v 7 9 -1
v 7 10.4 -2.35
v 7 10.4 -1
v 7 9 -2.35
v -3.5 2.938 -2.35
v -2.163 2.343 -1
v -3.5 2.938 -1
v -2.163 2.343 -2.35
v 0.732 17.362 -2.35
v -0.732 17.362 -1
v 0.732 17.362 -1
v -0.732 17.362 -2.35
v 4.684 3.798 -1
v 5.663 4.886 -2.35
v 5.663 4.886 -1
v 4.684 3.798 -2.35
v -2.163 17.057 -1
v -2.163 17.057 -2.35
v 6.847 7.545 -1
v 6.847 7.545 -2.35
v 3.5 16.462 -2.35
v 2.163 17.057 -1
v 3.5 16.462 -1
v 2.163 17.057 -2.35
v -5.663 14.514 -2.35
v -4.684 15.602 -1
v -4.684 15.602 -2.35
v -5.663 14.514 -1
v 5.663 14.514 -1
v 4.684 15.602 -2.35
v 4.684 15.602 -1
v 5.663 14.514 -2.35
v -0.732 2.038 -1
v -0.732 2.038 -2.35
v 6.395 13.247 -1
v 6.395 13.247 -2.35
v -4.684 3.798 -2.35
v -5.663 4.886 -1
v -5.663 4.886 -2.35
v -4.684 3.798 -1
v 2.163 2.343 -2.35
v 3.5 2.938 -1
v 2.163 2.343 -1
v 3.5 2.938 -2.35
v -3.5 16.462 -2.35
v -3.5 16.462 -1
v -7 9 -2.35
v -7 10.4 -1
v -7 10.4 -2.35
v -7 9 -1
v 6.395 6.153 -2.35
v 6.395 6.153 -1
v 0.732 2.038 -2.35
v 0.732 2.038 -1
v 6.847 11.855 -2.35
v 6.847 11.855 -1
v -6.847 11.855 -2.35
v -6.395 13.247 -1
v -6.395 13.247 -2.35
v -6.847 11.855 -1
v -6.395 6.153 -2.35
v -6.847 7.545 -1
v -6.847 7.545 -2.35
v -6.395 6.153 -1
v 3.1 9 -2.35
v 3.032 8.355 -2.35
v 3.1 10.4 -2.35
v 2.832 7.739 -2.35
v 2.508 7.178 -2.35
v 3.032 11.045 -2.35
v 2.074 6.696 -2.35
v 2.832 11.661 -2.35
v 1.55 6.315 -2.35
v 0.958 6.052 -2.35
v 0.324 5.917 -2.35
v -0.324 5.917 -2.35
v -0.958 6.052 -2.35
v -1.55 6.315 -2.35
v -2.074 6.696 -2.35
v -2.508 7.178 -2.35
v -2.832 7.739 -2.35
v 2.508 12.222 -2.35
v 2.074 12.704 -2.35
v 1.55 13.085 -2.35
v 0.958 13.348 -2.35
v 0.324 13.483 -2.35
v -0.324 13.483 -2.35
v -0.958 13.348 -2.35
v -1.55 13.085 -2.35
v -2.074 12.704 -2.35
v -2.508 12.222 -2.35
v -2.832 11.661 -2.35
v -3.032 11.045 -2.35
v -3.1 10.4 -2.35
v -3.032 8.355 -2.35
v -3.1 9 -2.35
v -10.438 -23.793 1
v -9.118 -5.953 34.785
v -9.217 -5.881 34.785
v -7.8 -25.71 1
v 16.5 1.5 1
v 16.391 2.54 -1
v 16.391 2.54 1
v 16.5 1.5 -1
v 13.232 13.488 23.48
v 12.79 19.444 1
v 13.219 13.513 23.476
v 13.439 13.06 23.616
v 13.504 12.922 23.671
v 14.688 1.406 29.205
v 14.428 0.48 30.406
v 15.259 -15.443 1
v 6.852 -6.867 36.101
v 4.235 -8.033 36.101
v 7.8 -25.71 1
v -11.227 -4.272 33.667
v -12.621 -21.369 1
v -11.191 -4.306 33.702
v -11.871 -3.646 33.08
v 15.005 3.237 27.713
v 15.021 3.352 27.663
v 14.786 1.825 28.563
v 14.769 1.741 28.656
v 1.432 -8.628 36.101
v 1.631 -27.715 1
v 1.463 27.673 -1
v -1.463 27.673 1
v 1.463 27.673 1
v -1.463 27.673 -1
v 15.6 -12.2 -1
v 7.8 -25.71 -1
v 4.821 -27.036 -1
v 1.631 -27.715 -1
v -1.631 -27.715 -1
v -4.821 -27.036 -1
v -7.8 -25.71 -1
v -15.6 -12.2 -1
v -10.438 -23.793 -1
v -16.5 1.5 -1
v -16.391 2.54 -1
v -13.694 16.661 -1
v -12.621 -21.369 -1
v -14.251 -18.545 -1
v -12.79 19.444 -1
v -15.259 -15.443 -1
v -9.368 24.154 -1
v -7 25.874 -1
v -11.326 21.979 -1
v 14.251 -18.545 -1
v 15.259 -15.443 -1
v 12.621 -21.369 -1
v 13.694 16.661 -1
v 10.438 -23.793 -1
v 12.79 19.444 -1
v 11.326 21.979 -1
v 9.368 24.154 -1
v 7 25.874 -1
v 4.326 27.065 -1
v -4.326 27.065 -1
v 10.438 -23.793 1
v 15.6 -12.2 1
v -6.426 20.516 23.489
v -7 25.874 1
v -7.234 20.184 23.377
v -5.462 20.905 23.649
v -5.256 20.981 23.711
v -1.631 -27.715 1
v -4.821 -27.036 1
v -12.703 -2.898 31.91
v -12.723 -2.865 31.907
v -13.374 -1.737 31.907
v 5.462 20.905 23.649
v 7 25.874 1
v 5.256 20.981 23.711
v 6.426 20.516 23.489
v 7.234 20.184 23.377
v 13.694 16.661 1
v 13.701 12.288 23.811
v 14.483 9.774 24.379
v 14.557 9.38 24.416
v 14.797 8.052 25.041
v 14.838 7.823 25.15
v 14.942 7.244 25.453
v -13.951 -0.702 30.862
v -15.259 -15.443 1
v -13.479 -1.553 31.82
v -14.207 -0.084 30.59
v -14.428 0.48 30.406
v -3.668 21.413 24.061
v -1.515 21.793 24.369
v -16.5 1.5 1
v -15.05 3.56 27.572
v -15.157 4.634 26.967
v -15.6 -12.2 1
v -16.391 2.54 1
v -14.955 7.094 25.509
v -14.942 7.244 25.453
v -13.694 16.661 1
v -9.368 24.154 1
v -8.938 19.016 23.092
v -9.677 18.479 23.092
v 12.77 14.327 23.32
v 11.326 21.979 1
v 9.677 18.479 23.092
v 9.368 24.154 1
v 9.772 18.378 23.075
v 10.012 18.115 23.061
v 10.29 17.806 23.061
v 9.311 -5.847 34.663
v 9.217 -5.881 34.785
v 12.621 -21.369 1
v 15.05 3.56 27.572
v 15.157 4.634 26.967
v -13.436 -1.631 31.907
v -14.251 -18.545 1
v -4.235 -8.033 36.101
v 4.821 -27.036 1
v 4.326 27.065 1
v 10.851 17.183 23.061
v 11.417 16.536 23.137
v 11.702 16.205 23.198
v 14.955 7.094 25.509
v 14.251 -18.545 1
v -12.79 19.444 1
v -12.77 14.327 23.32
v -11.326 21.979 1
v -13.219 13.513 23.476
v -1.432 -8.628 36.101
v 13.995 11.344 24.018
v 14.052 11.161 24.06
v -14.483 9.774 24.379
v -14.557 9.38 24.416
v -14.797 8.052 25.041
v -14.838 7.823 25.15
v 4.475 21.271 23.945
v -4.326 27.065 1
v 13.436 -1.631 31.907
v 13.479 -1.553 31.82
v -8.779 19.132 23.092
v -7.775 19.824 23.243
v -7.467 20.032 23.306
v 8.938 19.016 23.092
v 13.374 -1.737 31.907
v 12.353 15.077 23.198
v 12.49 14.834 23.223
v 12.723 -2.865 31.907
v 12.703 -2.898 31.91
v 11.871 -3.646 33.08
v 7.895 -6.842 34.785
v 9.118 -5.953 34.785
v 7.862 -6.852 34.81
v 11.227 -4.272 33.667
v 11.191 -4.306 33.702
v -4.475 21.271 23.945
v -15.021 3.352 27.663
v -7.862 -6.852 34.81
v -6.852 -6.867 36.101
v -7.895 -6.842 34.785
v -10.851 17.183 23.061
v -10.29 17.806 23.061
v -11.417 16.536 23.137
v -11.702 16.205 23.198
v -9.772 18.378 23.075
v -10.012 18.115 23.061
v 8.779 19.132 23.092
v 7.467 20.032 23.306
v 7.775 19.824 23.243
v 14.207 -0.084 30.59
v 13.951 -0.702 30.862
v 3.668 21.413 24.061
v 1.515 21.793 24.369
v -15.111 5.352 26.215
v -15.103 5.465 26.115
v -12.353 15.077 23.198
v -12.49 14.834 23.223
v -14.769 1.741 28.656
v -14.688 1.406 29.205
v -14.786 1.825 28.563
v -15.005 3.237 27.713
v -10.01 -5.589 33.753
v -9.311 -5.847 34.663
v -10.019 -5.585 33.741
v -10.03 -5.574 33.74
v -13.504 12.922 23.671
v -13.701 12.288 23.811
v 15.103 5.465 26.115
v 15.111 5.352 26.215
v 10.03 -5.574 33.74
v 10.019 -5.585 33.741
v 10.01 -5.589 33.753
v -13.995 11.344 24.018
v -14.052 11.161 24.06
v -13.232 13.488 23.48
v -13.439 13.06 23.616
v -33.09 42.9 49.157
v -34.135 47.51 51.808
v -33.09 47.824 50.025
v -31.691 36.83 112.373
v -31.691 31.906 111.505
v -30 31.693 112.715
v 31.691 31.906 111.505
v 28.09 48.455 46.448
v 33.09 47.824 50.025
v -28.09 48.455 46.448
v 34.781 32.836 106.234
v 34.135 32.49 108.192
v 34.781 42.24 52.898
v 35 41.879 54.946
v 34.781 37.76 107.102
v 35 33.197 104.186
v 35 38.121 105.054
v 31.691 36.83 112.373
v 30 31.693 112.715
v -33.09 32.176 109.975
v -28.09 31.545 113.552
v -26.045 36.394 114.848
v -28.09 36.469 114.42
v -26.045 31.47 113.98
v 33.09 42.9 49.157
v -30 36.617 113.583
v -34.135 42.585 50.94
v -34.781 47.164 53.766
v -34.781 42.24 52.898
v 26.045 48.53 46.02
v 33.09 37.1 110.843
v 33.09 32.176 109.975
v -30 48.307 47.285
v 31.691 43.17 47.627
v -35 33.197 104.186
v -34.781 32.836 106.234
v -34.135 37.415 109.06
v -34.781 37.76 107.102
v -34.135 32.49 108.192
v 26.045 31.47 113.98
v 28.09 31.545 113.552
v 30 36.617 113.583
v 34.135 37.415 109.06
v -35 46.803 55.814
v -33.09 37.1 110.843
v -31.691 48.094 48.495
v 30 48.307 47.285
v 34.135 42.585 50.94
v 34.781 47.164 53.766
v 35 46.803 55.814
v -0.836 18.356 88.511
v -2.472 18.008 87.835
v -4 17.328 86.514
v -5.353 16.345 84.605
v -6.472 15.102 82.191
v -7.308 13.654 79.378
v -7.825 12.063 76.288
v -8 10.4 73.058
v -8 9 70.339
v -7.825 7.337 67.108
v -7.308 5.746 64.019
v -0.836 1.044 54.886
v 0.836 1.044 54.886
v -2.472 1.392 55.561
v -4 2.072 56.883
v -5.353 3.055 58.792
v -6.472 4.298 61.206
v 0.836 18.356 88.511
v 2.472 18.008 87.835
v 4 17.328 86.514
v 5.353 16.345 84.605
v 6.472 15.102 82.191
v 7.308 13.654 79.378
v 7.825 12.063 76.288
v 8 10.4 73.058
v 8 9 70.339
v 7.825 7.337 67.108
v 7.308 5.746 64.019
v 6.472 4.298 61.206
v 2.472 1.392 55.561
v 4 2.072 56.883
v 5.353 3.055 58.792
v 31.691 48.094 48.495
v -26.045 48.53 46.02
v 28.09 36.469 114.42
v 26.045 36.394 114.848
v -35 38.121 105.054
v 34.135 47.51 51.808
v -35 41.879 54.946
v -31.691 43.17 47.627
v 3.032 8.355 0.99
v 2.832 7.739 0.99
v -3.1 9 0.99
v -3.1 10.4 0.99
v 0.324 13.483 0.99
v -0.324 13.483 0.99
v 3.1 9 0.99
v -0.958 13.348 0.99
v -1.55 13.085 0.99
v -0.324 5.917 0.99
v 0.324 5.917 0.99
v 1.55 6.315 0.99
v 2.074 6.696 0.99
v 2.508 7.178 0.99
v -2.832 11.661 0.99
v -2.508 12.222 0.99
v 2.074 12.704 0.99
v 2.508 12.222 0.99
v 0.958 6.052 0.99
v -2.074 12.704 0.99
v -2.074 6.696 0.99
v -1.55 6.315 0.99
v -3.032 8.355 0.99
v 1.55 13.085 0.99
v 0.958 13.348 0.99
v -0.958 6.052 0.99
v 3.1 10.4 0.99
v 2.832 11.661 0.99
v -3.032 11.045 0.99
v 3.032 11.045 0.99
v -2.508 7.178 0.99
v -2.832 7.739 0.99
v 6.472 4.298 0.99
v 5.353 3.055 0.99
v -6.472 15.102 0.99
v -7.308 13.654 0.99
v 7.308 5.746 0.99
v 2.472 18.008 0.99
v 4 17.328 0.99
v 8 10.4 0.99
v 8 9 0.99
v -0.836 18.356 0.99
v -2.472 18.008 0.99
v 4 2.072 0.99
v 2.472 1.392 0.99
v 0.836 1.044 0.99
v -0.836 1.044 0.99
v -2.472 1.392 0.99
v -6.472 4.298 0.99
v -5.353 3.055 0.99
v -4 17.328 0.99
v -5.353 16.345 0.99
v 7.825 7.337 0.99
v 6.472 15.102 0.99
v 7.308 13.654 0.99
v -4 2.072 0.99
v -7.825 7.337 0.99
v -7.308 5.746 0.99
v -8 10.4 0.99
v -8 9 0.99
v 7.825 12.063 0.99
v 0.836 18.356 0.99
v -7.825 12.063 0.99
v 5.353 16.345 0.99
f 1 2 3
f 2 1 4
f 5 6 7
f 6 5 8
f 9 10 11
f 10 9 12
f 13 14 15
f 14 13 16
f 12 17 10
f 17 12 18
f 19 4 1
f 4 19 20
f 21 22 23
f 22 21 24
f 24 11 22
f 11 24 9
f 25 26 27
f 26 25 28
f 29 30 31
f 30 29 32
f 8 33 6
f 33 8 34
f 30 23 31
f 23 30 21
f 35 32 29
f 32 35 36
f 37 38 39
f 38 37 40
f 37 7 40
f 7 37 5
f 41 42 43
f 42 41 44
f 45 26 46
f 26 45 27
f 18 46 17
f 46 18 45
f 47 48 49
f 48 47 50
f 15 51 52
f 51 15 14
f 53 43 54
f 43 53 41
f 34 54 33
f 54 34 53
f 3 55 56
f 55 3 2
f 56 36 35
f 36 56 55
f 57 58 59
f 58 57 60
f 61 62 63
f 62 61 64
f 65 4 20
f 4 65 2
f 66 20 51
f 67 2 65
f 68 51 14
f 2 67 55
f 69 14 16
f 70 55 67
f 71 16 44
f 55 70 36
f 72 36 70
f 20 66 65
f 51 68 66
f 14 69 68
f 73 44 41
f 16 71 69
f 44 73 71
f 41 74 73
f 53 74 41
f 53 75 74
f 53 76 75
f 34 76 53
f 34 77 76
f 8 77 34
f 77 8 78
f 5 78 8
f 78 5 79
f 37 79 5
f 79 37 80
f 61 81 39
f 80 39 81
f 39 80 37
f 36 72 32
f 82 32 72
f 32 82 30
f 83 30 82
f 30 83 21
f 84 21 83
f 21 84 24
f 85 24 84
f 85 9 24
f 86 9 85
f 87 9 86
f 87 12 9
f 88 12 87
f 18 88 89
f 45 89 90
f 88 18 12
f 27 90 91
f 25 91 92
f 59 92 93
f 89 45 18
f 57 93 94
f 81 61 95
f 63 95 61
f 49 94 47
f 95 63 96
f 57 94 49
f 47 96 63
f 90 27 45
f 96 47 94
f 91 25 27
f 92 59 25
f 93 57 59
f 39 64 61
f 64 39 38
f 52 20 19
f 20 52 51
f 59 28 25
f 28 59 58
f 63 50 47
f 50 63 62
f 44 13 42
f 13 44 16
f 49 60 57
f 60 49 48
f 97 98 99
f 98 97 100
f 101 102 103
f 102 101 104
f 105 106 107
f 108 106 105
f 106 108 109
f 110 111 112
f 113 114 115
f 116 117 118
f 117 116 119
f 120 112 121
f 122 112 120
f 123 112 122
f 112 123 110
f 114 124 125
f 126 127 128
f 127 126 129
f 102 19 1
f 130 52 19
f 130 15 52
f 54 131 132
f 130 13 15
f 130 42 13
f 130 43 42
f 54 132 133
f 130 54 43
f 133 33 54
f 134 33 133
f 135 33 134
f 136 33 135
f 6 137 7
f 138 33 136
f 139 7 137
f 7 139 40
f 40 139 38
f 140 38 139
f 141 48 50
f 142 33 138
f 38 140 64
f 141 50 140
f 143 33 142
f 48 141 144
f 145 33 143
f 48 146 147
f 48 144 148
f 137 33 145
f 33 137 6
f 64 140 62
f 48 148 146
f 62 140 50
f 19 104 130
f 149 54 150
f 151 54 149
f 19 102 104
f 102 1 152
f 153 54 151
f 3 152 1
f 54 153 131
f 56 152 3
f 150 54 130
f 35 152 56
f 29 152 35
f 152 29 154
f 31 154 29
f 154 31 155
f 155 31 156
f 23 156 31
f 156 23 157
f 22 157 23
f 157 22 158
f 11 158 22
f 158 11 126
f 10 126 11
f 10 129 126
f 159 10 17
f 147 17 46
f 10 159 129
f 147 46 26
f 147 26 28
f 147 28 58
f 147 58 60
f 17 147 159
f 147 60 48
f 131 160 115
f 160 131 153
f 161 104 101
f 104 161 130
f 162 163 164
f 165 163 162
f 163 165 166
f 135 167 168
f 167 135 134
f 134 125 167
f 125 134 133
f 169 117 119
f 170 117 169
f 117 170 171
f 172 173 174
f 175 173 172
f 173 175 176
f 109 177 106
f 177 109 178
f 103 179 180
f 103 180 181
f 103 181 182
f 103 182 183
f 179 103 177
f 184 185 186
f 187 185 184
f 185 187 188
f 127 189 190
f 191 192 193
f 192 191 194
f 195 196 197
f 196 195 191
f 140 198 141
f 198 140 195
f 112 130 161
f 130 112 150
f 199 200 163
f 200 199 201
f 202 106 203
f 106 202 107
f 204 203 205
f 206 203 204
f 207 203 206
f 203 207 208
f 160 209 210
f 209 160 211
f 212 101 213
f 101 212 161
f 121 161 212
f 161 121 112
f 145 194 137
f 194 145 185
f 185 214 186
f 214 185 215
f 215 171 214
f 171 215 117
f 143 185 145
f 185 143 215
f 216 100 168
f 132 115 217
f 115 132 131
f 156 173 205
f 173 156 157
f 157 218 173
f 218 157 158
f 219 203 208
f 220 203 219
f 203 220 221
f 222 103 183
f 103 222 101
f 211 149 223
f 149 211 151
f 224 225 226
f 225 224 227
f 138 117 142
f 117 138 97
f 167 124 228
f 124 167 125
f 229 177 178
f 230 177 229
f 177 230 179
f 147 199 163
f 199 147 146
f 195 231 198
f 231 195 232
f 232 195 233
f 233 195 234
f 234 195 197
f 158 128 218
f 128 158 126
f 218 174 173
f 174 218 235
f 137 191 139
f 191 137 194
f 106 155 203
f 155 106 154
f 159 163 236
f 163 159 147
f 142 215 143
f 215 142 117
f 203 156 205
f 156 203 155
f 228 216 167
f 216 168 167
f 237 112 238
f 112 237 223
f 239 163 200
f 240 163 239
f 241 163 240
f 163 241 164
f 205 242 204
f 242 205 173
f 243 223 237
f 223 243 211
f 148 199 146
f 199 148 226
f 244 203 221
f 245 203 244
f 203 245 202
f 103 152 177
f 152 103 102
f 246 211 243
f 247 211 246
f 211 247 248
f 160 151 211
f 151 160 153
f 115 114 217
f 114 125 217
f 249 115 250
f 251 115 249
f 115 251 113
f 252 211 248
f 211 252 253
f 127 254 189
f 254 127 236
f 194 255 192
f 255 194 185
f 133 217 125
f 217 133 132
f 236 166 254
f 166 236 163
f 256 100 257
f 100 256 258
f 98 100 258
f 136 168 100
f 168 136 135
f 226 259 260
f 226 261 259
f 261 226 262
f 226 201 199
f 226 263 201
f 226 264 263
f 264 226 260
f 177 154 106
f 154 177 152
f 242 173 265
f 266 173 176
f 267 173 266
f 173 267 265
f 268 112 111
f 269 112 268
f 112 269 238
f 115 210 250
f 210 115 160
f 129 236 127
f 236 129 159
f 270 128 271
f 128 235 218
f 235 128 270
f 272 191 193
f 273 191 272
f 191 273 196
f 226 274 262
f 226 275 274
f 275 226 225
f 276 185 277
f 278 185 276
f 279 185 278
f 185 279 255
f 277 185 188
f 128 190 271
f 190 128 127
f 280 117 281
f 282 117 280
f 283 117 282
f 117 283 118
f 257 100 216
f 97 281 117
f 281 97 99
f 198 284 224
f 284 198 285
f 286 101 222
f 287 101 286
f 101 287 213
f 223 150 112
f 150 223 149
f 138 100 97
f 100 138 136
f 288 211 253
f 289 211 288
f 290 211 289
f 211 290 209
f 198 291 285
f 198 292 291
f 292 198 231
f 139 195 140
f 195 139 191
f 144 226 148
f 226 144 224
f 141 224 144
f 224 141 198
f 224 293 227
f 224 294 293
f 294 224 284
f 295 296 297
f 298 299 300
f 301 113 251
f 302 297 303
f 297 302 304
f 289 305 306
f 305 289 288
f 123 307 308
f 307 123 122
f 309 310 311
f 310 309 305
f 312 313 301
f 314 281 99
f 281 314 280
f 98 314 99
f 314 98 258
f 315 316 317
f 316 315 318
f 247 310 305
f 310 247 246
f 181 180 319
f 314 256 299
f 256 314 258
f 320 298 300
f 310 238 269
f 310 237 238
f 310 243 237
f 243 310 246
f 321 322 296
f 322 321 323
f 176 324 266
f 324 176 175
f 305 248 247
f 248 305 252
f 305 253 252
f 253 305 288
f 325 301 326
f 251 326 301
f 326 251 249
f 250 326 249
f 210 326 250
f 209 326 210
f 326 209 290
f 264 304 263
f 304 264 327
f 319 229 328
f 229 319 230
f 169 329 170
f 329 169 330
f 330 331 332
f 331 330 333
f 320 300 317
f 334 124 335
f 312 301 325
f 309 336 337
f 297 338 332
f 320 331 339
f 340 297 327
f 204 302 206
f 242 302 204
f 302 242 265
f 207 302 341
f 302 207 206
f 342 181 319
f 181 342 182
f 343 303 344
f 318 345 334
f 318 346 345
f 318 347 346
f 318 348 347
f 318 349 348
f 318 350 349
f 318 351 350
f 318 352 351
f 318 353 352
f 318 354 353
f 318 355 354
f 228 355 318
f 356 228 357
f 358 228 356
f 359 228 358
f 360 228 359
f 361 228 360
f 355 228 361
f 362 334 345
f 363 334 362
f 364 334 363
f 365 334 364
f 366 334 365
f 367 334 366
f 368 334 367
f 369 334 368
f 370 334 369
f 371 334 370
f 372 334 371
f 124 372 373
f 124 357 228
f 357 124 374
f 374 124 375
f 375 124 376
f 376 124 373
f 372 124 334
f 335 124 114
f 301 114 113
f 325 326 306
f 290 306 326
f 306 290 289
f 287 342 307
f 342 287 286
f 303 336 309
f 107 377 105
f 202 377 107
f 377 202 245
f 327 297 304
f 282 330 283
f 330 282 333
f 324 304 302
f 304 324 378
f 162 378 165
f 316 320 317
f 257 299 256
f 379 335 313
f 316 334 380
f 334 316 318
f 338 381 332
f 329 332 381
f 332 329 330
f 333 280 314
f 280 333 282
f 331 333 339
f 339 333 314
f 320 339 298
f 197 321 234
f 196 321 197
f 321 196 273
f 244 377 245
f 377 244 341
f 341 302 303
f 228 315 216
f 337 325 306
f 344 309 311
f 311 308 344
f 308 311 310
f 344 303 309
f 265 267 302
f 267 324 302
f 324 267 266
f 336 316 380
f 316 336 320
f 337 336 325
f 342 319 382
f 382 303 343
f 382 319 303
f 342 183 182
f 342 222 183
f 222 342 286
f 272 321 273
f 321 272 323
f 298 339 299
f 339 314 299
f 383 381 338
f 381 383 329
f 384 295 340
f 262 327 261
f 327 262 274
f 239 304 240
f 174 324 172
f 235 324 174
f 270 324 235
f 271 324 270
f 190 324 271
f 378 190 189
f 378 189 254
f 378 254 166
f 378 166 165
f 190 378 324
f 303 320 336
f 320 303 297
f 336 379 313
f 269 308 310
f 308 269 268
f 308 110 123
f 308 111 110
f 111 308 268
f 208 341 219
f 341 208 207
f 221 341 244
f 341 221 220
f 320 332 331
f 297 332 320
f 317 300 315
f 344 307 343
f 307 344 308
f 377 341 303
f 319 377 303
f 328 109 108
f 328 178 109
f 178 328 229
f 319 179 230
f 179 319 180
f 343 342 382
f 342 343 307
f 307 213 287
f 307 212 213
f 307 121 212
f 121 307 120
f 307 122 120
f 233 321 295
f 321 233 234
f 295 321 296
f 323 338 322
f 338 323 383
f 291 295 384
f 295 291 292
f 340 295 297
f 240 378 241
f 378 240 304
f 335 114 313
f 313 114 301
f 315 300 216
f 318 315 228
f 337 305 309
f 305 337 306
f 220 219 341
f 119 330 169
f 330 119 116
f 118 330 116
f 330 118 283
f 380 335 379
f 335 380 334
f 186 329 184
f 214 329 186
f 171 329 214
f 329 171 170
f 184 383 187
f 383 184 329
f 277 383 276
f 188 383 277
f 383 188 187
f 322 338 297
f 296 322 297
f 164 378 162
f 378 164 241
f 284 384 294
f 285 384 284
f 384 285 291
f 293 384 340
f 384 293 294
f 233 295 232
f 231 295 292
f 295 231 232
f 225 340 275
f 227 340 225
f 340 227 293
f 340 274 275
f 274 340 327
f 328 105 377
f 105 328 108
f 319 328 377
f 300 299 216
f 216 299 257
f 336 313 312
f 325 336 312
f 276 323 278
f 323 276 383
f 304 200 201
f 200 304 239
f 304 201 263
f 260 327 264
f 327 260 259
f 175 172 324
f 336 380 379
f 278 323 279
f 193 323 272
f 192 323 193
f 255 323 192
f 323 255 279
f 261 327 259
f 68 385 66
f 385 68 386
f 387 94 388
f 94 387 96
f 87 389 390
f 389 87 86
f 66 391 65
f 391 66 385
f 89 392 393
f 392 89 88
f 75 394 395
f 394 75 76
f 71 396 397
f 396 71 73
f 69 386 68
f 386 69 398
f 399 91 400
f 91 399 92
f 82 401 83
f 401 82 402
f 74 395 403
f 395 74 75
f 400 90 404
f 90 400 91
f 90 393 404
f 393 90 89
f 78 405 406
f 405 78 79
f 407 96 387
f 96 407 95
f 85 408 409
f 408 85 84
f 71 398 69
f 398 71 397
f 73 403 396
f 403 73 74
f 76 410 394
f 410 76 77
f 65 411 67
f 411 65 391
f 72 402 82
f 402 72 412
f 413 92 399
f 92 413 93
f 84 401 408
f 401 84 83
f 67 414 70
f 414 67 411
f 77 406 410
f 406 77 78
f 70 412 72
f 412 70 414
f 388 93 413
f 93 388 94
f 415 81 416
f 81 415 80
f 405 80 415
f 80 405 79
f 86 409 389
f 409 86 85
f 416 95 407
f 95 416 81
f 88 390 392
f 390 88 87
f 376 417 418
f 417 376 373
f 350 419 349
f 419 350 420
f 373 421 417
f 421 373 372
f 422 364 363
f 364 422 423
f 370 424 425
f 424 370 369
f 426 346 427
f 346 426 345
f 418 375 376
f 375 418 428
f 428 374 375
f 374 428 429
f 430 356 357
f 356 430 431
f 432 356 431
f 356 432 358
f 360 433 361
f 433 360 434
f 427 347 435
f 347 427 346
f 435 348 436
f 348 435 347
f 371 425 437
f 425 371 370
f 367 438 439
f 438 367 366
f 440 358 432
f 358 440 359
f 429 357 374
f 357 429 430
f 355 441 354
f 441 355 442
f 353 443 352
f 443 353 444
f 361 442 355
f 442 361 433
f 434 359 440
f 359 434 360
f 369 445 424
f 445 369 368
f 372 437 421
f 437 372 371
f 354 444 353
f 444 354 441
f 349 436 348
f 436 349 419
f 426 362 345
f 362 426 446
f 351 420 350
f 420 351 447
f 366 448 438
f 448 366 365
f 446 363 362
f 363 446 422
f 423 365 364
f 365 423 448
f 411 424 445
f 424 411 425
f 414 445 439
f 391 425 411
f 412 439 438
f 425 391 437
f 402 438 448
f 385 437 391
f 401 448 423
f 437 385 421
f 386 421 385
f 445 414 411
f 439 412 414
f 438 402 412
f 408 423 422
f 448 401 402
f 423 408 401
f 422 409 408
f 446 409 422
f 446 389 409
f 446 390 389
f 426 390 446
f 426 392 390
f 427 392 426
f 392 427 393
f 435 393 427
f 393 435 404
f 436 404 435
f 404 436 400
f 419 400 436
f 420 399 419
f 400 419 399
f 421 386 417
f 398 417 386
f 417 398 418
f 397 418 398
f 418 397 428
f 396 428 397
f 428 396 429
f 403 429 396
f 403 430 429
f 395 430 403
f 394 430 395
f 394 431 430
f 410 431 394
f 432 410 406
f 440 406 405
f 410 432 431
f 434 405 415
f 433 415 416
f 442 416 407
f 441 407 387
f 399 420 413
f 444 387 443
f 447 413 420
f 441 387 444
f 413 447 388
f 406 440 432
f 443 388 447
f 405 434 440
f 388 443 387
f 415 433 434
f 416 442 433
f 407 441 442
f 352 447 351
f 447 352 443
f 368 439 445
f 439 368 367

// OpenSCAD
// file: ../Lib/mirrorcopy.scad
module mirrorCopy(vec=[1,0,0], vec2=[0,0,0], vec3=[0,0,0]){
    
    //echo(str("Vec1=",vec," Vec2=", vec2, " Vec3=", vec3));
    children();
    mirror(vec) children();

    if(vec2){    
        mirror(vec2){
            children();
            mirror(vec) children();
        }
    }

    if(vec3){
        mirror(vec3){
            children();
            mirror(vec) children();
            mirror(vec2){
                children();
                mirror(vec) children();
            }
        }
    }
    
} 

mirrorCopy([1,0,0])color("green")translate([5,10,0])cylinder(h=1,d=5,center=true);
mirrorCopy([1,0,0],[0,1,0])color("blue")translate([10,5,0])cylinder(h=1,d=5,center=true);
mirrorCopy([1,0,0],[0,1,0],[0,0,1])color("red")translate([15,10,5])cylinder(h=1,d=5,center=true);
// main file
use <../Lib/mirrorcopy.scad>
$fn=30;
module screw(){
    translate([0,-21+30,0+1]){
        hull(){
            translate([0,0,-15+0.01])cylinder(h=30, d=6.2, center=true);
            translate([0,15.4-14,-15+0.01])cylinder(h=30, d=6.2, center=true);
        }
        hull(){
            translate([0,0,(100/2)-0.01])cylinder(h=100, d=16, center=true);
            translate([0,15.4-14,(100/2)-0.01])cylinder(h=100, d=16, center=true);
        }
    }
}
module holes(){
    screw();
}
module mount(){
    translate([0,-21+30,2.35/-2]){
            hull(){
                cylinder(d=14,h=2.35, center=true);
                translate([0,15.4-14,0])
                    cylinder(d=14,h=2.35, center=true);
            }
        }

    hull(){
        color("orange")hull(){
            translate([0,-12.2,0])cylinder(d=31.2,h=2, center=true);
            translate([0,13.75,0])cylinder(d=28,  h=2, center=true);

            mirrorCopy(){
                translate([(33-10)/2,1.5,0])
                cylinder(d=10, h=2, center=true);
            }
        }
        
        joinball();
    }
}


module joinball(){
    translate([0,5,30])sphere(15);    
}

module platform(){
    hull(){
        #translate([0,40,80])rotate([90+10,0,0])hull(){
            mirrorCopy([1,0,0])mirrorCopy([0,1,0]){
                translate([25,25,0])cylinder(h=5, d=20, center=true);
            }
        }
        joinball();
    }
}
module plastic(){
    platform();
    mount();
}


difference(){
    plastic();
    holes();
}
